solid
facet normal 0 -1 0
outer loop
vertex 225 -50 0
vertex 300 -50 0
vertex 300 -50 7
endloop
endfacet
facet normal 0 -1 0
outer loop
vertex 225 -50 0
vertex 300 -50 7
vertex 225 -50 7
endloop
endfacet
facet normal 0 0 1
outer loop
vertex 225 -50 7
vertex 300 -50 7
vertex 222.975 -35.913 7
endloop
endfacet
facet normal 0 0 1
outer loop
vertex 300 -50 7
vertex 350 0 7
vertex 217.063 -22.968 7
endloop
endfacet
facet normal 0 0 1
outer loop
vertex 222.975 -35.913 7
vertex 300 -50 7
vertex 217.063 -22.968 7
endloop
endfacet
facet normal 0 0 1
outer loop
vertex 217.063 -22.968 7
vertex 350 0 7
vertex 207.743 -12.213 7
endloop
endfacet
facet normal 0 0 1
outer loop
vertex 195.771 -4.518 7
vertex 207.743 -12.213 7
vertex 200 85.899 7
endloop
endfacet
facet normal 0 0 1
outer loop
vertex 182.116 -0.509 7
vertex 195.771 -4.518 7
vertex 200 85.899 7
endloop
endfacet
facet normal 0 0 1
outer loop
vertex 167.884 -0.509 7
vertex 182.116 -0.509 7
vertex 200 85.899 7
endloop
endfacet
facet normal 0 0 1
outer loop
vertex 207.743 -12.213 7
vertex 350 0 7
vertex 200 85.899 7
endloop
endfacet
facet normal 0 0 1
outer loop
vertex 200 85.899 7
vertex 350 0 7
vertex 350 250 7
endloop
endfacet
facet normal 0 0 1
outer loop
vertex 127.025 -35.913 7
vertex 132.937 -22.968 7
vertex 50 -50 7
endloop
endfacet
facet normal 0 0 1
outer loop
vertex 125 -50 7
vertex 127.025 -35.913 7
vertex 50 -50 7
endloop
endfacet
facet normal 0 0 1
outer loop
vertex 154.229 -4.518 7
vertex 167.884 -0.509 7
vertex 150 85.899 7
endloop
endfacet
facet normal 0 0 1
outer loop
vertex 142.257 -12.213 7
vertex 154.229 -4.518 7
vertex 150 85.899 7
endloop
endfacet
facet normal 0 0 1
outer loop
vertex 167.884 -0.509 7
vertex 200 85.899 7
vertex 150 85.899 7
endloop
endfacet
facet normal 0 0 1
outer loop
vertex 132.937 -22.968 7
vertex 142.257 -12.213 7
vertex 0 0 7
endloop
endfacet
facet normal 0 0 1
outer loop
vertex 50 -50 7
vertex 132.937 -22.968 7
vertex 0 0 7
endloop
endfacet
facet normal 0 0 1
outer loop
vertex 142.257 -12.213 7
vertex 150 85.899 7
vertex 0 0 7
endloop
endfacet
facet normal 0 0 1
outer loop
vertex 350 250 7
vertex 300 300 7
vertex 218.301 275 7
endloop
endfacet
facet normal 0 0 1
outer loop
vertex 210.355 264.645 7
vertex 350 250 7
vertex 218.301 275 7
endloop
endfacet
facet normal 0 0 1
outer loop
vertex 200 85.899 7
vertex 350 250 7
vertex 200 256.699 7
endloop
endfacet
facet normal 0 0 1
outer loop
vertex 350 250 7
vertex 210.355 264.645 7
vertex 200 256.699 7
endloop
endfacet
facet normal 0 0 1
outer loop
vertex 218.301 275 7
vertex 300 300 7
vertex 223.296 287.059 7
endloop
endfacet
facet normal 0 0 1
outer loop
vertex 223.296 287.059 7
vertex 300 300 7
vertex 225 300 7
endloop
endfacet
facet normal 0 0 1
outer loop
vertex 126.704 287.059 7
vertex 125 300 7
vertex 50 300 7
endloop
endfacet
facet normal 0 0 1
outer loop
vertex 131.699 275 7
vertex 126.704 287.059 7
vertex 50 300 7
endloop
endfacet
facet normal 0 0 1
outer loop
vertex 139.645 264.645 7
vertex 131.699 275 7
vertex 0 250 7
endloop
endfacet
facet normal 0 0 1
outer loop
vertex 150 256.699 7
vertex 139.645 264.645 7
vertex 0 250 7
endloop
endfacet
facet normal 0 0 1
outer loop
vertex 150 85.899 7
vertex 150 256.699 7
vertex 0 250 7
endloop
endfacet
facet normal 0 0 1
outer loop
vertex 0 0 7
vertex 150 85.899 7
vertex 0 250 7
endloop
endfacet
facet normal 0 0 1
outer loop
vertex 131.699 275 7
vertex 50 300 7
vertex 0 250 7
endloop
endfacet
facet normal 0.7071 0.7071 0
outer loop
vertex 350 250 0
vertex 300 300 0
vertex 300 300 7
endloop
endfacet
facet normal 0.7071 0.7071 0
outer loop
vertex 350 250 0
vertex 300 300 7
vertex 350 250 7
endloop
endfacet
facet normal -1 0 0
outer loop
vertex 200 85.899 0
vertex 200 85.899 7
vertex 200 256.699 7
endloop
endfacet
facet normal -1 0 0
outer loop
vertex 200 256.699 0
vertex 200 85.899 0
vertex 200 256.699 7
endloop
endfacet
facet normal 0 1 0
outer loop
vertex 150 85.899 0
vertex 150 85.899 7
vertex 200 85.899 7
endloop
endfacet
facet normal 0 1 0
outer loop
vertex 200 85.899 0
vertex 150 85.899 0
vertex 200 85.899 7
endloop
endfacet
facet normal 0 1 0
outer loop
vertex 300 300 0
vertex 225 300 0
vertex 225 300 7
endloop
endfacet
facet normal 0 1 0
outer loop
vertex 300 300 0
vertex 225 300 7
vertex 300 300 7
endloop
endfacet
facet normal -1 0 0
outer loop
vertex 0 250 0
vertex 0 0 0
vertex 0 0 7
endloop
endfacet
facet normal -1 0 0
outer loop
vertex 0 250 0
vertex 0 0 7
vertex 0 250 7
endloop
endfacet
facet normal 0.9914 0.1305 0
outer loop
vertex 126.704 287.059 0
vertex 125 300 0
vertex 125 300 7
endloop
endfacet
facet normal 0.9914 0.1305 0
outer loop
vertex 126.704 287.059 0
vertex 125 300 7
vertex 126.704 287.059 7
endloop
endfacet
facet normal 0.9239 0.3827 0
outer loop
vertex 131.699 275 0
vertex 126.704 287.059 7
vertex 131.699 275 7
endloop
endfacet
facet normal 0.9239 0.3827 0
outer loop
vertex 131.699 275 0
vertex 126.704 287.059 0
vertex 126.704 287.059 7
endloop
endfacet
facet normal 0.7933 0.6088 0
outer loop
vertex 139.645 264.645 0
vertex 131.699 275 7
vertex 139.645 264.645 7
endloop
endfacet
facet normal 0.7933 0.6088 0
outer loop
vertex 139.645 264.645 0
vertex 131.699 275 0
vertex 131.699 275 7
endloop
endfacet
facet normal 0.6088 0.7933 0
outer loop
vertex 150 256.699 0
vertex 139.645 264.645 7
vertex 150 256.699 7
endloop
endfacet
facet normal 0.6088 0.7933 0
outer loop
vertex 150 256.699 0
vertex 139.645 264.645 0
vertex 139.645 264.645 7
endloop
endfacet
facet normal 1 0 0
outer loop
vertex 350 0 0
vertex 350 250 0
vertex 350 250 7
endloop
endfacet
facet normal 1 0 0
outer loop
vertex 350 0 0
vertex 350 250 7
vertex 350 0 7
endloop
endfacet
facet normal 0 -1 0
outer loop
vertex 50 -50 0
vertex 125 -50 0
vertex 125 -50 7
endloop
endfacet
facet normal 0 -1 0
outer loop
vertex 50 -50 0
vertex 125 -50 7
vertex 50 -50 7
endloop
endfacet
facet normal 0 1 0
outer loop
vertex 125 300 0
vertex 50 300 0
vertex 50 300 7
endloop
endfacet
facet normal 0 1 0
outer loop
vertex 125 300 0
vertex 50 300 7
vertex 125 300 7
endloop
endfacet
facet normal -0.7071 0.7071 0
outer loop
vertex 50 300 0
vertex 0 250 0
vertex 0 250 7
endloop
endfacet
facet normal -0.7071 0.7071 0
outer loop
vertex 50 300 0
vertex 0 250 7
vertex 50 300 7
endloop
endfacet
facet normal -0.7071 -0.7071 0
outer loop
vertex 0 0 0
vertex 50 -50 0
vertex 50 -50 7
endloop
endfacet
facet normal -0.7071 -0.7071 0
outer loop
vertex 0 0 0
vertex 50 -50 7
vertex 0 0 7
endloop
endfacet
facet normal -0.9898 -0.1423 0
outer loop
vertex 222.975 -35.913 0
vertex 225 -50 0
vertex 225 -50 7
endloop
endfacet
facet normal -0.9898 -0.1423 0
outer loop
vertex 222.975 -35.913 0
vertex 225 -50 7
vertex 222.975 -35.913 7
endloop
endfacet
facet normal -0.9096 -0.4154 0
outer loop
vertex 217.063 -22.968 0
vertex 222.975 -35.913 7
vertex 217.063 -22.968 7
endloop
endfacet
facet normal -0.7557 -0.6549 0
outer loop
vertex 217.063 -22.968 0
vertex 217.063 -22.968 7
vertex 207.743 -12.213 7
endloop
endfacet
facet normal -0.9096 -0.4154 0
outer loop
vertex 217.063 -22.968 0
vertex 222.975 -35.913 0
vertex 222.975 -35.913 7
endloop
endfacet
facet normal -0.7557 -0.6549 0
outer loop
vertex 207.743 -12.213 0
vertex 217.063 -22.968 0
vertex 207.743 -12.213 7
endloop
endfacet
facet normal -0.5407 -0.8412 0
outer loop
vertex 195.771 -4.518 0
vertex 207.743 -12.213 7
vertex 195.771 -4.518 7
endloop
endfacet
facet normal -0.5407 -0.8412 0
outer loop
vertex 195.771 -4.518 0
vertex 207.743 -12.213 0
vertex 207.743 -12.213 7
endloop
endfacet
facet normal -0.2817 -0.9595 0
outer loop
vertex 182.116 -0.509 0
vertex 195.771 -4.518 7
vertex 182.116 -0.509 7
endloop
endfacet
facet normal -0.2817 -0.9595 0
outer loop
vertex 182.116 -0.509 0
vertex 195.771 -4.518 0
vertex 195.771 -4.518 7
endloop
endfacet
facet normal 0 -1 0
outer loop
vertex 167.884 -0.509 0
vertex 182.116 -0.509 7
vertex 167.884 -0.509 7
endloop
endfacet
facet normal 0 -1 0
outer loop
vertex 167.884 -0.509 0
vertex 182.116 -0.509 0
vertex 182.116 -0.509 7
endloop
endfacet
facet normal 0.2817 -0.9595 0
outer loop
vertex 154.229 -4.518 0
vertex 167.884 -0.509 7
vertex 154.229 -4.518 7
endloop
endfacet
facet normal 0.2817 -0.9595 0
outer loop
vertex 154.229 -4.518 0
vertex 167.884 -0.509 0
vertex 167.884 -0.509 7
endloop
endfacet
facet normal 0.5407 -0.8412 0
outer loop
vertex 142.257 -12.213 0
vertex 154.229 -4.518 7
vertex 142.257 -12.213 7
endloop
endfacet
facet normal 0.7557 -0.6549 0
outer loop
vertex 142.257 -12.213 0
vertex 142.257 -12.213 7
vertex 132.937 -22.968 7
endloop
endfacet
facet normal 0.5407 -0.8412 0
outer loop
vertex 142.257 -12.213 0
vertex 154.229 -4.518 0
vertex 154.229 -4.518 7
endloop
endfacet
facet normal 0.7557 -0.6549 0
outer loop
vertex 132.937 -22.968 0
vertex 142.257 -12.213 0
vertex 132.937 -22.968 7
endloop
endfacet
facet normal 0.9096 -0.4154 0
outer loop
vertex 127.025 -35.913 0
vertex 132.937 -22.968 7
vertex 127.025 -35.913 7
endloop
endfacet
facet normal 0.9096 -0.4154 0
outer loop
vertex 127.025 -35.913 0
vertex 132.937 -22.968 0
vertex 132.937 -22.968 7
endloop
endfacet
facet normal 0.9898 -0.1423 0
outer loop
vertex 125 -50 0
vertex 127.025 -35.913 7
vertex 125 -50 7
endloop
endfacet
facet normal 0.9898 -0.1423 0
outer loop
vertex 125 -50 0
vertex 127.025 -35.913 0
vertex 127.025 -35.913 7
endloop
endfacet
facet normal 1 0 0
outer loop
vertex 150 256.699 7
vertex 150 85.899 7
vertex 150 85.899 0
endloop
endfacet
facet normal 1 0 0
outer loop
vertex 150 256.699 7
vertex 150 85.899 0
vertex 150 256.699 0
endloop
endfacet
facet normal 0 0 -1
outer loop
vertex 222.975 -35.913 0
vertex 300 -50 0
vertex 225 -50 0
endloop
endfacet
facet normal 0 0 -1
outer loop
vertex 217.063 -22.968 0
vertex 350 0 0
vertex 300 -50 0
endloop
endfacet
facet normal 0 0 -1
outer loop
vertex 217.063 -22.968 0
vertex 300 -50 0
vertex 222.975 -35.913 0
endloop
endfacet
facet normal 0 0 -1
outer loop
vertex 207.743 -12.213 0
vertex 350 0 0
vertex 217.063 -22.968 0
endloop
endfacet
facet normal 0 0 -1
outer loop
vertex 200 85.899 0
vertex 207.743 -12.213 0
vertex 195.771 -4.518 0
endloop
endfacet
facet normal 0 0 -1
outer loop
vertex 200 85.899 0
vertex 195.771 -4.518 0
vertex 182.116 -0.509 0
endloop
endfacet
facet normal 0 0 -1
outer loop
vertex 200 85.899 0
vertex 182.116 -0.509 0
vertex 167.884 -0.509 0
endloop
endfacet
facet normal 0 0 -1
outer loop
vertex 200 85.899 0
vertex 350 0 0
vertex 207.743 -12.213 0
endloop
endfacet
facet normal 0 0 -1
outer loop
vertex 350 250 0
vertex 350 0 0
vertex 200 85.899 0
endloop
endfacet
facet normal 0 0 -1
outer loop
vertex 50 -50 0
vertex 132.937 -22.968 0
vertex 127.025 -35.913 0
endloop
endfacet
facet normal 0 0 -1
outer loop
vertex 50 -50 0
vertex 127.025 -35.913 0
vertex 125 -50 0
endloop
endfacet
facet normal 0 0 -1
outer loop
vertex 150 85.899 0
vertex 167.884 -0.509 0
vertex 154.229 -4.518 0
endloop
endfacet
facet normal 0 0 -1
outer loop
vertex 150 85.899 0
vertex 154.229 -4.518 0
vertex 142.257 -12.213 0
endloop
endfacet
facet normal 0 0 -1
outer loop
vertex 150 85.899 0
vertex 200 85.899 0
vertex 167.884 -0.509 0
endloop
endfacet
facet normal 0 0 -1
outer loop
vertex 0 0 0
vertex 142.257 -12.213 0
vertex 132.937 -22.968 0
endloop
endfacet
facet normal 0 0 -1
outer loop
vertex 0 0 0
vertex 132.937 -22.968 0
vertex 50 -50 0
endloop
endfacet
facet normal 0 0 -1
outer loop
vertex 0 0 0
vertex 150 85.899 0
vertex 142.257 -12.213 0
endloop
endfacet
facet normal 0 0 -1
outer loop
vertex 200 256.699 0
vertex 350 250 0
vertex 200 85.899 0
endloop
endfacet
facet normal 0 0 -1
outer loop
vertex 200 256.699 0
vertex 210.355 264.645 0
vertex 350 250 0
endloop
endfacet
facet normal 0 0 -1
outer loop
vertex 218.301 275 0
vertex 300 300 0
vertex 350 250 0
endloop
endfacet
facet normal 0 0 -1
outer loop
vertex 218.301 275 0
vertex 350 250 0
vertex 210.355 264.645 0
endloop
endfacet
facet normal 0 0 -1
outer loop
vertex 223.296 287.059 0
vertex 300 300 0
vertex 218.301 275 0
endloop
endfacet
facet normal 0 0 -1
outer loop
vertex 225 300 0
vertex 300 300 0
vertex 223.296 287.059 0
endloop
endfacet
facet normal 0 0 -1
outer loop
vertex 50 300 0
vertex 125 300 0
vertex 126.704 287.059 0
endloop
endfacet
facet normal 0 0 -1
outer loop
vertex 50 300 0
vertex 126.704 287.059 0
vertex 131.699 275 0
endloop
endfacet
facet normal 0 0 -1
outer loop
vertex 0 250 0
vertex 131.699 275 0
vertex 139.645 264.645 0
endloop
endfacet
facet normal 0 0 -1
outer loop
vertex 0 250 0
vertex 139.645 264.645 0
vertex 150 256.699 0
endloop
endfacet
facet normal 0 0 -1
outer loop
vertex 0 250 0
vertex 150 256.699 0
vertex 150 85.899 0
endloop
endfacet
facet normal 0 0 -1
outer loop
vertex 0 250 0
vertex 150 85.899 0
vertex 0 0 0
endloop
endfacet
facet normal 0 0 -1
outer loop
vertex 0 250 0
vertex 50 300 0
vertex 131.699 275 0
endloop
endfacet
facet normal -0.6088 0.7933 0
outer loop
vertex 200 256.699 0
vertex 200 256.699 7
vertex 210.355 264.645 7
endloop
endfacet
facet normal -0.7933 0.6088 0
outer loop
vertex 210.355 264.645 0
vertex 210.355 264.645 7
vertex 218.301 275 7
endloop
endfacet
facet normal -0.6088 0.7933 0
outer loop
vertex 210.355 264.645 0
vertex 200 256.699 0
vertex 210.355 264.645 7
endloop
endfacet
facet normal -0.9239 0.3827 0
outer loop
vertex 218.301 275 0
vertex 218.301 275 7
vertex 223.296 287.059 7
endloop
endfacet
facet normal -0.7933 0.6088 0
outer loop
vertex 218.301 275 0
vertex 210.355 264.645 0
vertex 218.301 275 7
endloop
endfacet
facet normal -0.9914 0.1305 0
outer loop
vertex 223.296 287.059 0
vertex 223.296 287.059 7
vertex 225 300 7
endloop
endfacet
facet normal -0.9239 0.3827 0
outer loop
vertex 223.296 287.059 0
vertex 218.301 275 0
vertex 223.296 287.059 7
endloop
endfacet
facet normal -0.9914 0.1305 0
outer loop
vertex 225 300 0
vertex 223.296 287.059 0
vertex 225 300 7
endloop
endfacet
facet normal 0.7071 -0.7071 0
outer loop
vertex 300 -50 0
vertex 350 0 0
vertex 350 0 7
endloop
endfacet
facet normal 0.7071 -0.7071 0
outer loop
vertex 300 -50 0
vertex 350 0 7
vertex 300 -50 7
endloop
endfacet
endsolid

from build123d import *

# Parameters (mm, degrees)
BOSS_EXTRUDE1_DEPTH = 7
SKETCH3_W           = 50
SKETCH3_H           = 212.444289875
CUT_EXTRUDE2_DEPTH  = 8


with BuildPart() as part:
    # Sketch1 → Boss-Extrude1 (new body)
    with BuildSketch(Plane.XY):
        with BuildLine():
            Line((0, 0), (0, 250))
            Line((0, 250), (50, 300))
            Line((50, 300), (125, 300))
            ThreePointArc((125, 300), (175, 250), (225, 300))
            Line((225, 300), (300, 300))
            Line((300, 300), (350, 250))
            Line((350, 250), (350, 0))
            Line((350, 0), (300, -50))
            Line((300, -50), (225, -50))
            ThreePointArc((225, -50), (175, 0), (125, -50))
            Line((125, -50), (50, -50))
            Line((50, -50), (0, 0))
        make_face()
    extrude(amount=BOSS_EXTRUDE1_DEPTH)

    # Sketch3 → Cut-Extrude2 (cut, through all)
    with BuildSketch(Plane.XY.offset(7)):
        with Locations((175, 192.120840959)):
            Rectangle(SKETCH3_W, SKETCH3_H)
    extrude(amount=-CUT_EXTRUDE2_DEPTH, mode=Mode.SUBTRACT)


solid = part.part
